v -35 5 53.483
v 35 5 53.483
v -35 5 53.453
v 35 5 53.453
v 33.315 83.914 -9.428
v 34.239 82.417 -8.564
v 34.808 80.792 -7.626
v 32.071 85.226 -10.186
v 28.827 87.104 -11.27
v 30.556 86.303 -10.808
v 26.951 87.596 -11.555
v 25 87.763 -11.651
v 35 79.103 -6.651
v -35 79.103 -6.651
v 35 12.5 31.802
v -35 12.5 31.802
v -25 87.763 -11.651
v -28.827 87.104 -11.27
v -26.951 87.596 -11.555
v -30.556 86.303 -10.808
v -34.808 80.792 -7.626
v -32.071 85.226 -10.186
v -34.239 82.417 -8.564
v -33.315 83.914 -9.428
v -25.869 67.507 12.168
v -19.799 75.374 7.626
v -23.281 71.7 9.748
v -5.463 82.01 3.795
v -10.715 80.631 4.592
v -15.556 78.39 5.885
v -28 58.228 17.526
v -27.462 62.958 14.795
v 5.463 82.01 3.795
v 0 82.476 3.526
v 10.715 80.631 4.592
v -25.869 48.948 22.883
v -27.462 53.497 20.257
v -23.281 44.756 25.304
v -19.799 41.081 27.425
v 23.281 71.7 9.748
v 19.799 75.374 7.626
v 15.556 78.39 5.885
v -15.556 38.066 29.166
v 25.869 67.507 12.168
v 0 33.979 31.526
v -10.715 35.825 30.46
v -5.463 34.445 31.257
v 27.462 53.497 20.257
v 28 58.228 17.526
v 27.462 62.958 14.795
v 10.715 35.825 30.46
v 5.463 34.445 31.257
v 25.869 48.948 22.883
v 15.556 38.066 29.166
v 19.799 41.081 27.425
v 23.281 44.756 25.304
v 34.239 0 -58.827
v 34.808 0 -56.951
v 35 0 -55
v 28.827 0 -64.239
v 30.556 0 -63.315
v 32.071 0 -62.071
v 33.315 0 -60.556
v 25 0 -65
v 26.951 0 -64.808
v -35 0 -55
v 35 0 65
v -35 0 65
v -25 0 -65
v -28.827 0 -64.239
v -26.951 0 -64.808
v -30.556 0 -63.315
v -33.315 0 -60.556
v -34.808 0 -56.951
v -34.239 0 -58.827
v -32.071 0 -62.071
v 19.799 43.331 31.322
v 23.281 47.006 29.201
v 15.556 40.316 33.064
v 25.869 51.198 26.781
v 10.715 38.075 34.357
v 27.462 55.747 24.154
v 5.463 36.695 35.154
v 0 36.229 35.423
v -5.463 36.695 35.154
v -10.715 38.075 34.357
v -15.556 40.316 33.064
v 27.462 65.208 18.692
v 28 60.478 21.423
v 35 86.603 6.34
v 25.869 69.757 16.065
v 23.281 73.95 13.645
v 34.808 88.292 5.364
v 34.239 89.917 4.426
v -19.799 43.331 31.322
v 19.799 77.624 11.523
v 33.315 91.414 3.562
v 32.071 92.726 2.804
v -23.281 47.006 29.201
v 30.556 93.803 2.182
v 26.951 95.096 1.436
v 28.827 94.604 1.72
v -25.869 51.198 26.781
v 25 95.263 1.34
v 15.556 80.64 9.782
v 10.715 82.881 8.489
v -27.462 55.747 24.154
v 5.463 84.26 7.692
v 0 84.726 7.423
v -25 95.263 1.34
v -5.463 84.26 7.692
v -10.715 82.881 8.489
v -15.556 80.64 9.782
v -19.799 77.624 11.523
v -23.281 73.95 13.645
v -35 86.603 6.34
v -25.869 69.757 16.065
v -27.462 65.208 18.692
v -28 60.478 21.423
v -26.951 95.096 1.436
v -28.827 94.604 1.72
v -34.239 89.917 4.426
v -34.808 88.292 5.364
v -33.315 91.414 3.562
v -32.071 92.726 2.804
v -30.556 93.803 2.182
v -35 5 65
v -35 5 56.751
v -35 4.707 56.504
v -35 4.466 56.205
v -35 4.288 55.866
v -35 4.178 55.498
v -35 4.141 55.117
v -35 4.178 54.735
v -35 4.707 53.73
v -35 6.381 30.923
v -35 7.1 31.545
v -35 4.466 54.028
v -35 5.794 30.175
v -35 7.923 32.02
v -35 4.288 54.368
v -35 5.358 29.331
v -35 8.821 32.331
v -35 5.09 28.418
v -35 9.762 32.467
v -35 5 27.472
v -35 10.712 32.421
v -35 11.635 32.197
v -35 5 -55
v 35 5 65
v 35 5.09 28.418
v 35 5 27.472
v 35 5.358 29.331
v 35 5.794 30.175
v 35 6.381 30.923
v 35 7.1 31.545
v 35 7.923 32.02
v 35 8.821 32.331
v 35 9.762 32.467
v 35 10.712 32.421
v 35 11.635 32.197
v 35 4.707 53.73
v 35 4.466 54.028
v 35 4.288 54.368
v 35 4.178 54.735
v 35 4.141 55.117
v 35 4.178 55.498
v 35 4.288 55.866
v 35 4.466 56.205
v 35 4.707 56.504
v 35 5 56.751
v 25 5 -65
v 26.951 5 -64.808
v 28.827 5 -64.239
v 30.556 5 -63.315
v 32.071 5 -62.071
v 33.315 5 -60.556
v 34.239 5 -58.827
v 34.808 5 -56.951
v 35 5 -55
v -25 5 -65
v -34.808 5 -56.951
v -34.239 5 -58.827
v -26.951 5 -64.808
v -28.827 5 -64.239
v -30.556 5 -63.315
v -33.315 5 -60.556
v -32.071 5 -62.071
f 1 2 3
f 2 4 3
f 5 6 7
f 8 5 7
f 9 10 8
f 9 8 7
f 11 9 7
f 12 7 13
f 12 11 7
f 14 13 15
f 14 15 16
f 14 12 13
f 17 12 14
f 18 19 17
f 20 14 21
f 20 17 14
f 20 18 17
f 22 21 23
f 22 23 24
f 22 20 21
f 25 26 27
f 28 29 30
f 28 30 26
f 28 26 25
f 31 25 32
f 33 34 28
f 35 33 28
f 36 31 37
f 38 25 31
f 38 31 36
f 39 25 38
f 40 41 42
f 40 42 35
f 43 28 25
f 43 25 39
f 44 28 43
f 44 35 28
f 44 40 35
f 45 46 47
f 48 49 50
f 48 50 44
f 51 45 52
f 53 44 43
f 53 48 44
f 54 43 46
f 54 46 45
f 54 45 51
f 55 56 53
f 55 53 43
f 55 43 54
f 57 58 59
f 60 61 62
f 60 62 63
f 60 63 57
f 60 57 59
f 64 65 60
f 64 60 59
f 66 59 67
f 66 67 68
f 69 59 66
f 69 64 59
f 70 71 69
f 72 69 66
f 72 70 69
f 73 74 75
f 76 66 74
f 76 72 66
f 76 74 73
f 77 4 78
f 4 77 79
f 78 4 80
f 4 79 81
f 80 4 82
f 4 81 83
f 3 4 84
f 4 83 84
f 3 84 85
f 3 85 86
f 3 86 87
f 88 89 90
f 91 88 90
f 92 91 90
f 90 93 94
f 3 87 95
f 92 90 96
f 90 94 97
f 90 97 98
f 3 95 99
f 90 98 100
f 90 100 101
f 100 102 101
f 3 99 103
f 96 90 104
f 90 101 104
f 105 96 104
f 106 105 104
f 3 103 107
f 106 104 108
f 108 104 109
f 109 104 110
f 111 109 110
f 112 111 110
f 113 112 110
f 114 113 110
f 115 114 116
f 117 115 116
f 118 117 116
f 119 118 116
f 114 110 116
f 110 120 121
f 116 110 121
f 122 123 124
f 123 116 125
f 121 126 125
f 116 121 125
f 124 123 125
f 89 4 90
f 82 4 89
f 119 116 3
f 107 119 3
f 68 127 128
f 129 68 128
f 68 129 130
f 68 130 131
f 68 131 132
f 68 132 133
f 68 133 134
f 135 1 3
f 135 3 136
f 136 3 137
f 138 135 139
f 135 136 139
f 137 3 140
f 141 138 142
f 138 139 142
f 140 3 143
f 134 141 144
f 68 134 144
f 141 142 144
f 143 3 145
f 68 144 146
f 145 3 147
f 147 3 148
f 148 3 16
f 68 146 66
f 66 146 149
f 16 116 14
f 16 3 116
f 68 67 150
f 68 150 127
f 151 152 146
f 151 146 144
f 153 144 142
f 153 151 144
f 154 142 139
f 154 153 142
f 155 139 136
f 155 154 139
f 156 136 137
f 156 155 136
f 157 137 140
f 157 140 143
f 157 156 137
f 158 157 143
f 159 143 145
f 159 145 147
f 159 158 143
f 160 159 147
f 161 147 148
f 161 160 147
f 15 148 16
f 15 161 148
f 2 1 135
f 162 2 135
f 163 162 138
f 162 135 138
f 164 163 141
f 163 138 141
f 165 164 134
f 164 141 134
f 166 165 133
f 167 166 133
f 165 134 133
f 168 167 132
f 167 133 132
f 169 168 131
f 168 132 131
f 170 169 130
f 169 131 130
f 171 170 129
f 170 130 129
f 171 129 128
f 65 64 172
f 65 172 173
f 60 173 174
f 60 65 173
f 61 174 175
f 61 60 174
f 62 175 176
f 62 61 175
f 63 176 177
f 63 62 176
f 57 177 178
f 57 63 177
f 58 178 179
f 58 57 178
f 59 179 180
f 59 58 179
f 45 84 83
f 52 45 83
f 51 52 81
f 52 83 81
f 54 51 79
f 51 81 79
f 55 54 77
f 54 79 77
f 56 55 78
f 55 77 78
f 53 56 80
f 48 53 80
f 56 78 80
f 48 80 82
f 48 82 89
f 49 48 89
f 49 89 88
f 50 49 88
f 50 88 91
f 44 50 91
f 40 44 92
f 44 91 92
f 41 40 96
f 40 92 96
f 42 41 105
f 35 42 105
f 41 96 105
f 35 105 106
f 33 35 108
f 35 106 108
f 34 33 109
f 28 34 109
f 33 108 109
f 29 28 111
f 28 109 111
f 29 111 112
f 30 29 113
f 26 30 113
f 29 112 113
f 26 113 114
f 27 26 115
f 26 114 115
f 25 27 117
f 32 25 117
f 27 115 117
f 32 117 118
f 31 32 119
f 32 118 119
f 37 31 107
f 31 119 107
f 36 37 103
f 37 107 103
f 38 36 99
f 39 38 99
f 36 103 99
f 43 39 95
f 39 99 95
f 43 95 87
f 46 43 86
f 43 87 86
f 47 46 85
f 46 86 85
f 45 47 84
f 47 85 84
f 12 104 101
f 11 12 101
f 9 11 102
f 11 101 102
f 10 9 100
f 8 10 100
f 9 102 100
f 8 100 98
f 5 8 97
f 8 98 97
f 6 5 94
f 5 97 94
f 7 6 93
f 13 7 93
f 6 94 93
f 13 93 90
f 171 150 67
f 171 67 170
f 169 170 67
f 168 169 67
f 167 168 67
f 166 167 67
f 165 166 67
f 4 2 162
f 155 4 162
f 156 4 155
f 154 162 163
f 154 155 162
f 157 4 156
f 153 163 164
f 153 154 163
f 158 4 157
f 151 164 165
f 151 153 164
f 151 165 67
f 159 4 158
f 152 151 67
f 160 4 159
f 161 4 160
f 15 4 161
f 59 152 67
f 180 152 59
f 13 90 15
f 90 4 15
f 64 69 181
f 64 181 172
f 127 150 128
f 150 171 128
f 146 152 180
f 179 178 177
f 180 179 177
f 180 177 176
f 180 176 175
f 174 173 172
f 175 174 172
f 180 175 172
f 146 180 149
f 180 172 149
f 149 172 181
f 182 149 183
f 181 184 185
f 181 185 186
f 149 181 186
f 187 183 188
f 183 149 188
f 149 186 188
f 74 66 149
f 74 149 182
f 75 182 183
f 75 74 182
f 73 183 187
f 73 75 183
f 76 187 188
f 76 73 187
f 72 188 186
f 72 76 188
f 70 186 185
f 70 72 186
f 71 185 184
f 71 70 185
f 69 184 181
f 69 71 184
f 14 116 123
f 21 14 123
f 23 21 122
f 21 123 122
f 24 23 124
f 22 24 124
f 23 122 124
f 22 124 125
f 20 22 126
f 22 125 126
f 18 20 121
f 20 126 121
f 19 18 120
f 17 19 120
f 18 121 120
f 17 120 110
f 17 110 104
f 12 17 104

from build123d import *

# Parameters (mm, degrees)
EXTRUDE_1_DEPTH     = 5
EXTRUDE_3_DEPTH     = 15
SKETCH_9_W          = 119.641605024
SKETCH_9_H          = 10.286902638
CUT_EXTRUDE_2_DEPTH = 165.924225025
SKETCH_10_R         = 1.982942862
CUT_EXTRUDE_3_DEPTH = 135.907375632
EXTRUDE_5_DEPTH     = 70
SKETCH_14_R         = 28
CUT_EXTRUDE_5_DEPTH = 4.5


with BuildPart() as part:
    # 草图1 → 凸台-拉伸1 (new body)
    with BuildSketch(Plane(origin=(0, 0, 0), x_dir=(1, 0, 0), z_dir=(0, 1, 0))):
        with BuildLine():
            Line((-25, 65), (25, 65))
            ThreePointArc((25, 65), (32.071067812, 62.071067812), (35, 55))
            Line((35, 55), (35, -65))
            Line((35, -65), (-35, -65))
            Line((-35, -65), (-35, 55))
            ThreePointArc((-35, 55), (-32.071067812, 62.071067812), (-25, 65))
        make_face()
    extrude(amount=EXTRUDE_1_DEPTH)

    # 草图8 → 凸台-拉伸3 (add)
    with BuildSketch(Plane(origin=(0, 24.395825623, 42.254809472), x_dir=(1, 0, 0), z_dir=(0, 0.499999999999998, 0.8660254037844398))):
        with BuildLine():
            ThreePointArc((25, 81.830127019), (32.071067812, 78.901194831), (35, 71.830127019))
            Line((35, 71.830127019), (35, -28.169872981))
            Line((35, -28.169872981), (-35, -28.169872981))
            Line((-35, -28.169872981), (-35, 71.830127019))
            ThreePointArc((-35, 71.830127019), (-32.071067812, 78.901194831), (-25, 81.830127019))
            Line((-25, 81.830127019), (25, 81.830127019))
        make_face()
    extrude(amount=-EXTRUDE_3_DEPTH)

    # 草图9 → 切除-拉伸2 (cut, through all)
    with BuildSketch(Plane.XY.offset(65)):
        with Locations((24.820802512, -5.143451319)):
            Rectangle(SKETCH_9_W, SKETCH_9_H)
    extrude(amount=-CUT_EXTRUDE_2_DEPTH, mode=Mode.SUBTRACT)

    # 草图10 → 切除-拉伸3 (cut, through all)
    with BuildSketch(Plane.ZY.offset(35)):
        with Locations((55.11669843, 6.123569619)):
            Circle(SKETCH_10_R)
    extrude(amount=-CUT_EXTRUDE_3_DEPTH, mode=Mode.SUBTRACT)

    # 草图13 → 凸台-拉伸5 (add)
    with BuildSketch(Plane(origin=(35, 0, 0), x_dir=(0, 0, -1), z_dir=(1, 0, 0))):
        with BuildLine():
            Line((-31.802359522, 12.5), (-36.132486541, 5))
            Line((-36.132486541, 5), (-27.472232503, 5))
            ThreePointArc((-27.472232503, 5), (-31.802359522, 7.5), (-31.802359522, 12.5))
        make_face()
    extrude(amount=-EXTRUDE_5_DEPTH)

    # 草图14 → 切除-拉伸5 (cut)
    with BuildSketch(Plane(origin=(0, 24.395825623, 42.254809472), x_dir=(1, 0, 0), z_dir=(0, 0.49999999999999806, 0.8660254037844398))):
        with Locations(Location((0, 41.66372629, 0), (0, 0, 270))):
            Circle(SKETCH_14_R)
    extrude(amount=-CUT_EXTRUDE_5_DEPTH, mode=Mode.SUBTRACT)


solid = part.part
